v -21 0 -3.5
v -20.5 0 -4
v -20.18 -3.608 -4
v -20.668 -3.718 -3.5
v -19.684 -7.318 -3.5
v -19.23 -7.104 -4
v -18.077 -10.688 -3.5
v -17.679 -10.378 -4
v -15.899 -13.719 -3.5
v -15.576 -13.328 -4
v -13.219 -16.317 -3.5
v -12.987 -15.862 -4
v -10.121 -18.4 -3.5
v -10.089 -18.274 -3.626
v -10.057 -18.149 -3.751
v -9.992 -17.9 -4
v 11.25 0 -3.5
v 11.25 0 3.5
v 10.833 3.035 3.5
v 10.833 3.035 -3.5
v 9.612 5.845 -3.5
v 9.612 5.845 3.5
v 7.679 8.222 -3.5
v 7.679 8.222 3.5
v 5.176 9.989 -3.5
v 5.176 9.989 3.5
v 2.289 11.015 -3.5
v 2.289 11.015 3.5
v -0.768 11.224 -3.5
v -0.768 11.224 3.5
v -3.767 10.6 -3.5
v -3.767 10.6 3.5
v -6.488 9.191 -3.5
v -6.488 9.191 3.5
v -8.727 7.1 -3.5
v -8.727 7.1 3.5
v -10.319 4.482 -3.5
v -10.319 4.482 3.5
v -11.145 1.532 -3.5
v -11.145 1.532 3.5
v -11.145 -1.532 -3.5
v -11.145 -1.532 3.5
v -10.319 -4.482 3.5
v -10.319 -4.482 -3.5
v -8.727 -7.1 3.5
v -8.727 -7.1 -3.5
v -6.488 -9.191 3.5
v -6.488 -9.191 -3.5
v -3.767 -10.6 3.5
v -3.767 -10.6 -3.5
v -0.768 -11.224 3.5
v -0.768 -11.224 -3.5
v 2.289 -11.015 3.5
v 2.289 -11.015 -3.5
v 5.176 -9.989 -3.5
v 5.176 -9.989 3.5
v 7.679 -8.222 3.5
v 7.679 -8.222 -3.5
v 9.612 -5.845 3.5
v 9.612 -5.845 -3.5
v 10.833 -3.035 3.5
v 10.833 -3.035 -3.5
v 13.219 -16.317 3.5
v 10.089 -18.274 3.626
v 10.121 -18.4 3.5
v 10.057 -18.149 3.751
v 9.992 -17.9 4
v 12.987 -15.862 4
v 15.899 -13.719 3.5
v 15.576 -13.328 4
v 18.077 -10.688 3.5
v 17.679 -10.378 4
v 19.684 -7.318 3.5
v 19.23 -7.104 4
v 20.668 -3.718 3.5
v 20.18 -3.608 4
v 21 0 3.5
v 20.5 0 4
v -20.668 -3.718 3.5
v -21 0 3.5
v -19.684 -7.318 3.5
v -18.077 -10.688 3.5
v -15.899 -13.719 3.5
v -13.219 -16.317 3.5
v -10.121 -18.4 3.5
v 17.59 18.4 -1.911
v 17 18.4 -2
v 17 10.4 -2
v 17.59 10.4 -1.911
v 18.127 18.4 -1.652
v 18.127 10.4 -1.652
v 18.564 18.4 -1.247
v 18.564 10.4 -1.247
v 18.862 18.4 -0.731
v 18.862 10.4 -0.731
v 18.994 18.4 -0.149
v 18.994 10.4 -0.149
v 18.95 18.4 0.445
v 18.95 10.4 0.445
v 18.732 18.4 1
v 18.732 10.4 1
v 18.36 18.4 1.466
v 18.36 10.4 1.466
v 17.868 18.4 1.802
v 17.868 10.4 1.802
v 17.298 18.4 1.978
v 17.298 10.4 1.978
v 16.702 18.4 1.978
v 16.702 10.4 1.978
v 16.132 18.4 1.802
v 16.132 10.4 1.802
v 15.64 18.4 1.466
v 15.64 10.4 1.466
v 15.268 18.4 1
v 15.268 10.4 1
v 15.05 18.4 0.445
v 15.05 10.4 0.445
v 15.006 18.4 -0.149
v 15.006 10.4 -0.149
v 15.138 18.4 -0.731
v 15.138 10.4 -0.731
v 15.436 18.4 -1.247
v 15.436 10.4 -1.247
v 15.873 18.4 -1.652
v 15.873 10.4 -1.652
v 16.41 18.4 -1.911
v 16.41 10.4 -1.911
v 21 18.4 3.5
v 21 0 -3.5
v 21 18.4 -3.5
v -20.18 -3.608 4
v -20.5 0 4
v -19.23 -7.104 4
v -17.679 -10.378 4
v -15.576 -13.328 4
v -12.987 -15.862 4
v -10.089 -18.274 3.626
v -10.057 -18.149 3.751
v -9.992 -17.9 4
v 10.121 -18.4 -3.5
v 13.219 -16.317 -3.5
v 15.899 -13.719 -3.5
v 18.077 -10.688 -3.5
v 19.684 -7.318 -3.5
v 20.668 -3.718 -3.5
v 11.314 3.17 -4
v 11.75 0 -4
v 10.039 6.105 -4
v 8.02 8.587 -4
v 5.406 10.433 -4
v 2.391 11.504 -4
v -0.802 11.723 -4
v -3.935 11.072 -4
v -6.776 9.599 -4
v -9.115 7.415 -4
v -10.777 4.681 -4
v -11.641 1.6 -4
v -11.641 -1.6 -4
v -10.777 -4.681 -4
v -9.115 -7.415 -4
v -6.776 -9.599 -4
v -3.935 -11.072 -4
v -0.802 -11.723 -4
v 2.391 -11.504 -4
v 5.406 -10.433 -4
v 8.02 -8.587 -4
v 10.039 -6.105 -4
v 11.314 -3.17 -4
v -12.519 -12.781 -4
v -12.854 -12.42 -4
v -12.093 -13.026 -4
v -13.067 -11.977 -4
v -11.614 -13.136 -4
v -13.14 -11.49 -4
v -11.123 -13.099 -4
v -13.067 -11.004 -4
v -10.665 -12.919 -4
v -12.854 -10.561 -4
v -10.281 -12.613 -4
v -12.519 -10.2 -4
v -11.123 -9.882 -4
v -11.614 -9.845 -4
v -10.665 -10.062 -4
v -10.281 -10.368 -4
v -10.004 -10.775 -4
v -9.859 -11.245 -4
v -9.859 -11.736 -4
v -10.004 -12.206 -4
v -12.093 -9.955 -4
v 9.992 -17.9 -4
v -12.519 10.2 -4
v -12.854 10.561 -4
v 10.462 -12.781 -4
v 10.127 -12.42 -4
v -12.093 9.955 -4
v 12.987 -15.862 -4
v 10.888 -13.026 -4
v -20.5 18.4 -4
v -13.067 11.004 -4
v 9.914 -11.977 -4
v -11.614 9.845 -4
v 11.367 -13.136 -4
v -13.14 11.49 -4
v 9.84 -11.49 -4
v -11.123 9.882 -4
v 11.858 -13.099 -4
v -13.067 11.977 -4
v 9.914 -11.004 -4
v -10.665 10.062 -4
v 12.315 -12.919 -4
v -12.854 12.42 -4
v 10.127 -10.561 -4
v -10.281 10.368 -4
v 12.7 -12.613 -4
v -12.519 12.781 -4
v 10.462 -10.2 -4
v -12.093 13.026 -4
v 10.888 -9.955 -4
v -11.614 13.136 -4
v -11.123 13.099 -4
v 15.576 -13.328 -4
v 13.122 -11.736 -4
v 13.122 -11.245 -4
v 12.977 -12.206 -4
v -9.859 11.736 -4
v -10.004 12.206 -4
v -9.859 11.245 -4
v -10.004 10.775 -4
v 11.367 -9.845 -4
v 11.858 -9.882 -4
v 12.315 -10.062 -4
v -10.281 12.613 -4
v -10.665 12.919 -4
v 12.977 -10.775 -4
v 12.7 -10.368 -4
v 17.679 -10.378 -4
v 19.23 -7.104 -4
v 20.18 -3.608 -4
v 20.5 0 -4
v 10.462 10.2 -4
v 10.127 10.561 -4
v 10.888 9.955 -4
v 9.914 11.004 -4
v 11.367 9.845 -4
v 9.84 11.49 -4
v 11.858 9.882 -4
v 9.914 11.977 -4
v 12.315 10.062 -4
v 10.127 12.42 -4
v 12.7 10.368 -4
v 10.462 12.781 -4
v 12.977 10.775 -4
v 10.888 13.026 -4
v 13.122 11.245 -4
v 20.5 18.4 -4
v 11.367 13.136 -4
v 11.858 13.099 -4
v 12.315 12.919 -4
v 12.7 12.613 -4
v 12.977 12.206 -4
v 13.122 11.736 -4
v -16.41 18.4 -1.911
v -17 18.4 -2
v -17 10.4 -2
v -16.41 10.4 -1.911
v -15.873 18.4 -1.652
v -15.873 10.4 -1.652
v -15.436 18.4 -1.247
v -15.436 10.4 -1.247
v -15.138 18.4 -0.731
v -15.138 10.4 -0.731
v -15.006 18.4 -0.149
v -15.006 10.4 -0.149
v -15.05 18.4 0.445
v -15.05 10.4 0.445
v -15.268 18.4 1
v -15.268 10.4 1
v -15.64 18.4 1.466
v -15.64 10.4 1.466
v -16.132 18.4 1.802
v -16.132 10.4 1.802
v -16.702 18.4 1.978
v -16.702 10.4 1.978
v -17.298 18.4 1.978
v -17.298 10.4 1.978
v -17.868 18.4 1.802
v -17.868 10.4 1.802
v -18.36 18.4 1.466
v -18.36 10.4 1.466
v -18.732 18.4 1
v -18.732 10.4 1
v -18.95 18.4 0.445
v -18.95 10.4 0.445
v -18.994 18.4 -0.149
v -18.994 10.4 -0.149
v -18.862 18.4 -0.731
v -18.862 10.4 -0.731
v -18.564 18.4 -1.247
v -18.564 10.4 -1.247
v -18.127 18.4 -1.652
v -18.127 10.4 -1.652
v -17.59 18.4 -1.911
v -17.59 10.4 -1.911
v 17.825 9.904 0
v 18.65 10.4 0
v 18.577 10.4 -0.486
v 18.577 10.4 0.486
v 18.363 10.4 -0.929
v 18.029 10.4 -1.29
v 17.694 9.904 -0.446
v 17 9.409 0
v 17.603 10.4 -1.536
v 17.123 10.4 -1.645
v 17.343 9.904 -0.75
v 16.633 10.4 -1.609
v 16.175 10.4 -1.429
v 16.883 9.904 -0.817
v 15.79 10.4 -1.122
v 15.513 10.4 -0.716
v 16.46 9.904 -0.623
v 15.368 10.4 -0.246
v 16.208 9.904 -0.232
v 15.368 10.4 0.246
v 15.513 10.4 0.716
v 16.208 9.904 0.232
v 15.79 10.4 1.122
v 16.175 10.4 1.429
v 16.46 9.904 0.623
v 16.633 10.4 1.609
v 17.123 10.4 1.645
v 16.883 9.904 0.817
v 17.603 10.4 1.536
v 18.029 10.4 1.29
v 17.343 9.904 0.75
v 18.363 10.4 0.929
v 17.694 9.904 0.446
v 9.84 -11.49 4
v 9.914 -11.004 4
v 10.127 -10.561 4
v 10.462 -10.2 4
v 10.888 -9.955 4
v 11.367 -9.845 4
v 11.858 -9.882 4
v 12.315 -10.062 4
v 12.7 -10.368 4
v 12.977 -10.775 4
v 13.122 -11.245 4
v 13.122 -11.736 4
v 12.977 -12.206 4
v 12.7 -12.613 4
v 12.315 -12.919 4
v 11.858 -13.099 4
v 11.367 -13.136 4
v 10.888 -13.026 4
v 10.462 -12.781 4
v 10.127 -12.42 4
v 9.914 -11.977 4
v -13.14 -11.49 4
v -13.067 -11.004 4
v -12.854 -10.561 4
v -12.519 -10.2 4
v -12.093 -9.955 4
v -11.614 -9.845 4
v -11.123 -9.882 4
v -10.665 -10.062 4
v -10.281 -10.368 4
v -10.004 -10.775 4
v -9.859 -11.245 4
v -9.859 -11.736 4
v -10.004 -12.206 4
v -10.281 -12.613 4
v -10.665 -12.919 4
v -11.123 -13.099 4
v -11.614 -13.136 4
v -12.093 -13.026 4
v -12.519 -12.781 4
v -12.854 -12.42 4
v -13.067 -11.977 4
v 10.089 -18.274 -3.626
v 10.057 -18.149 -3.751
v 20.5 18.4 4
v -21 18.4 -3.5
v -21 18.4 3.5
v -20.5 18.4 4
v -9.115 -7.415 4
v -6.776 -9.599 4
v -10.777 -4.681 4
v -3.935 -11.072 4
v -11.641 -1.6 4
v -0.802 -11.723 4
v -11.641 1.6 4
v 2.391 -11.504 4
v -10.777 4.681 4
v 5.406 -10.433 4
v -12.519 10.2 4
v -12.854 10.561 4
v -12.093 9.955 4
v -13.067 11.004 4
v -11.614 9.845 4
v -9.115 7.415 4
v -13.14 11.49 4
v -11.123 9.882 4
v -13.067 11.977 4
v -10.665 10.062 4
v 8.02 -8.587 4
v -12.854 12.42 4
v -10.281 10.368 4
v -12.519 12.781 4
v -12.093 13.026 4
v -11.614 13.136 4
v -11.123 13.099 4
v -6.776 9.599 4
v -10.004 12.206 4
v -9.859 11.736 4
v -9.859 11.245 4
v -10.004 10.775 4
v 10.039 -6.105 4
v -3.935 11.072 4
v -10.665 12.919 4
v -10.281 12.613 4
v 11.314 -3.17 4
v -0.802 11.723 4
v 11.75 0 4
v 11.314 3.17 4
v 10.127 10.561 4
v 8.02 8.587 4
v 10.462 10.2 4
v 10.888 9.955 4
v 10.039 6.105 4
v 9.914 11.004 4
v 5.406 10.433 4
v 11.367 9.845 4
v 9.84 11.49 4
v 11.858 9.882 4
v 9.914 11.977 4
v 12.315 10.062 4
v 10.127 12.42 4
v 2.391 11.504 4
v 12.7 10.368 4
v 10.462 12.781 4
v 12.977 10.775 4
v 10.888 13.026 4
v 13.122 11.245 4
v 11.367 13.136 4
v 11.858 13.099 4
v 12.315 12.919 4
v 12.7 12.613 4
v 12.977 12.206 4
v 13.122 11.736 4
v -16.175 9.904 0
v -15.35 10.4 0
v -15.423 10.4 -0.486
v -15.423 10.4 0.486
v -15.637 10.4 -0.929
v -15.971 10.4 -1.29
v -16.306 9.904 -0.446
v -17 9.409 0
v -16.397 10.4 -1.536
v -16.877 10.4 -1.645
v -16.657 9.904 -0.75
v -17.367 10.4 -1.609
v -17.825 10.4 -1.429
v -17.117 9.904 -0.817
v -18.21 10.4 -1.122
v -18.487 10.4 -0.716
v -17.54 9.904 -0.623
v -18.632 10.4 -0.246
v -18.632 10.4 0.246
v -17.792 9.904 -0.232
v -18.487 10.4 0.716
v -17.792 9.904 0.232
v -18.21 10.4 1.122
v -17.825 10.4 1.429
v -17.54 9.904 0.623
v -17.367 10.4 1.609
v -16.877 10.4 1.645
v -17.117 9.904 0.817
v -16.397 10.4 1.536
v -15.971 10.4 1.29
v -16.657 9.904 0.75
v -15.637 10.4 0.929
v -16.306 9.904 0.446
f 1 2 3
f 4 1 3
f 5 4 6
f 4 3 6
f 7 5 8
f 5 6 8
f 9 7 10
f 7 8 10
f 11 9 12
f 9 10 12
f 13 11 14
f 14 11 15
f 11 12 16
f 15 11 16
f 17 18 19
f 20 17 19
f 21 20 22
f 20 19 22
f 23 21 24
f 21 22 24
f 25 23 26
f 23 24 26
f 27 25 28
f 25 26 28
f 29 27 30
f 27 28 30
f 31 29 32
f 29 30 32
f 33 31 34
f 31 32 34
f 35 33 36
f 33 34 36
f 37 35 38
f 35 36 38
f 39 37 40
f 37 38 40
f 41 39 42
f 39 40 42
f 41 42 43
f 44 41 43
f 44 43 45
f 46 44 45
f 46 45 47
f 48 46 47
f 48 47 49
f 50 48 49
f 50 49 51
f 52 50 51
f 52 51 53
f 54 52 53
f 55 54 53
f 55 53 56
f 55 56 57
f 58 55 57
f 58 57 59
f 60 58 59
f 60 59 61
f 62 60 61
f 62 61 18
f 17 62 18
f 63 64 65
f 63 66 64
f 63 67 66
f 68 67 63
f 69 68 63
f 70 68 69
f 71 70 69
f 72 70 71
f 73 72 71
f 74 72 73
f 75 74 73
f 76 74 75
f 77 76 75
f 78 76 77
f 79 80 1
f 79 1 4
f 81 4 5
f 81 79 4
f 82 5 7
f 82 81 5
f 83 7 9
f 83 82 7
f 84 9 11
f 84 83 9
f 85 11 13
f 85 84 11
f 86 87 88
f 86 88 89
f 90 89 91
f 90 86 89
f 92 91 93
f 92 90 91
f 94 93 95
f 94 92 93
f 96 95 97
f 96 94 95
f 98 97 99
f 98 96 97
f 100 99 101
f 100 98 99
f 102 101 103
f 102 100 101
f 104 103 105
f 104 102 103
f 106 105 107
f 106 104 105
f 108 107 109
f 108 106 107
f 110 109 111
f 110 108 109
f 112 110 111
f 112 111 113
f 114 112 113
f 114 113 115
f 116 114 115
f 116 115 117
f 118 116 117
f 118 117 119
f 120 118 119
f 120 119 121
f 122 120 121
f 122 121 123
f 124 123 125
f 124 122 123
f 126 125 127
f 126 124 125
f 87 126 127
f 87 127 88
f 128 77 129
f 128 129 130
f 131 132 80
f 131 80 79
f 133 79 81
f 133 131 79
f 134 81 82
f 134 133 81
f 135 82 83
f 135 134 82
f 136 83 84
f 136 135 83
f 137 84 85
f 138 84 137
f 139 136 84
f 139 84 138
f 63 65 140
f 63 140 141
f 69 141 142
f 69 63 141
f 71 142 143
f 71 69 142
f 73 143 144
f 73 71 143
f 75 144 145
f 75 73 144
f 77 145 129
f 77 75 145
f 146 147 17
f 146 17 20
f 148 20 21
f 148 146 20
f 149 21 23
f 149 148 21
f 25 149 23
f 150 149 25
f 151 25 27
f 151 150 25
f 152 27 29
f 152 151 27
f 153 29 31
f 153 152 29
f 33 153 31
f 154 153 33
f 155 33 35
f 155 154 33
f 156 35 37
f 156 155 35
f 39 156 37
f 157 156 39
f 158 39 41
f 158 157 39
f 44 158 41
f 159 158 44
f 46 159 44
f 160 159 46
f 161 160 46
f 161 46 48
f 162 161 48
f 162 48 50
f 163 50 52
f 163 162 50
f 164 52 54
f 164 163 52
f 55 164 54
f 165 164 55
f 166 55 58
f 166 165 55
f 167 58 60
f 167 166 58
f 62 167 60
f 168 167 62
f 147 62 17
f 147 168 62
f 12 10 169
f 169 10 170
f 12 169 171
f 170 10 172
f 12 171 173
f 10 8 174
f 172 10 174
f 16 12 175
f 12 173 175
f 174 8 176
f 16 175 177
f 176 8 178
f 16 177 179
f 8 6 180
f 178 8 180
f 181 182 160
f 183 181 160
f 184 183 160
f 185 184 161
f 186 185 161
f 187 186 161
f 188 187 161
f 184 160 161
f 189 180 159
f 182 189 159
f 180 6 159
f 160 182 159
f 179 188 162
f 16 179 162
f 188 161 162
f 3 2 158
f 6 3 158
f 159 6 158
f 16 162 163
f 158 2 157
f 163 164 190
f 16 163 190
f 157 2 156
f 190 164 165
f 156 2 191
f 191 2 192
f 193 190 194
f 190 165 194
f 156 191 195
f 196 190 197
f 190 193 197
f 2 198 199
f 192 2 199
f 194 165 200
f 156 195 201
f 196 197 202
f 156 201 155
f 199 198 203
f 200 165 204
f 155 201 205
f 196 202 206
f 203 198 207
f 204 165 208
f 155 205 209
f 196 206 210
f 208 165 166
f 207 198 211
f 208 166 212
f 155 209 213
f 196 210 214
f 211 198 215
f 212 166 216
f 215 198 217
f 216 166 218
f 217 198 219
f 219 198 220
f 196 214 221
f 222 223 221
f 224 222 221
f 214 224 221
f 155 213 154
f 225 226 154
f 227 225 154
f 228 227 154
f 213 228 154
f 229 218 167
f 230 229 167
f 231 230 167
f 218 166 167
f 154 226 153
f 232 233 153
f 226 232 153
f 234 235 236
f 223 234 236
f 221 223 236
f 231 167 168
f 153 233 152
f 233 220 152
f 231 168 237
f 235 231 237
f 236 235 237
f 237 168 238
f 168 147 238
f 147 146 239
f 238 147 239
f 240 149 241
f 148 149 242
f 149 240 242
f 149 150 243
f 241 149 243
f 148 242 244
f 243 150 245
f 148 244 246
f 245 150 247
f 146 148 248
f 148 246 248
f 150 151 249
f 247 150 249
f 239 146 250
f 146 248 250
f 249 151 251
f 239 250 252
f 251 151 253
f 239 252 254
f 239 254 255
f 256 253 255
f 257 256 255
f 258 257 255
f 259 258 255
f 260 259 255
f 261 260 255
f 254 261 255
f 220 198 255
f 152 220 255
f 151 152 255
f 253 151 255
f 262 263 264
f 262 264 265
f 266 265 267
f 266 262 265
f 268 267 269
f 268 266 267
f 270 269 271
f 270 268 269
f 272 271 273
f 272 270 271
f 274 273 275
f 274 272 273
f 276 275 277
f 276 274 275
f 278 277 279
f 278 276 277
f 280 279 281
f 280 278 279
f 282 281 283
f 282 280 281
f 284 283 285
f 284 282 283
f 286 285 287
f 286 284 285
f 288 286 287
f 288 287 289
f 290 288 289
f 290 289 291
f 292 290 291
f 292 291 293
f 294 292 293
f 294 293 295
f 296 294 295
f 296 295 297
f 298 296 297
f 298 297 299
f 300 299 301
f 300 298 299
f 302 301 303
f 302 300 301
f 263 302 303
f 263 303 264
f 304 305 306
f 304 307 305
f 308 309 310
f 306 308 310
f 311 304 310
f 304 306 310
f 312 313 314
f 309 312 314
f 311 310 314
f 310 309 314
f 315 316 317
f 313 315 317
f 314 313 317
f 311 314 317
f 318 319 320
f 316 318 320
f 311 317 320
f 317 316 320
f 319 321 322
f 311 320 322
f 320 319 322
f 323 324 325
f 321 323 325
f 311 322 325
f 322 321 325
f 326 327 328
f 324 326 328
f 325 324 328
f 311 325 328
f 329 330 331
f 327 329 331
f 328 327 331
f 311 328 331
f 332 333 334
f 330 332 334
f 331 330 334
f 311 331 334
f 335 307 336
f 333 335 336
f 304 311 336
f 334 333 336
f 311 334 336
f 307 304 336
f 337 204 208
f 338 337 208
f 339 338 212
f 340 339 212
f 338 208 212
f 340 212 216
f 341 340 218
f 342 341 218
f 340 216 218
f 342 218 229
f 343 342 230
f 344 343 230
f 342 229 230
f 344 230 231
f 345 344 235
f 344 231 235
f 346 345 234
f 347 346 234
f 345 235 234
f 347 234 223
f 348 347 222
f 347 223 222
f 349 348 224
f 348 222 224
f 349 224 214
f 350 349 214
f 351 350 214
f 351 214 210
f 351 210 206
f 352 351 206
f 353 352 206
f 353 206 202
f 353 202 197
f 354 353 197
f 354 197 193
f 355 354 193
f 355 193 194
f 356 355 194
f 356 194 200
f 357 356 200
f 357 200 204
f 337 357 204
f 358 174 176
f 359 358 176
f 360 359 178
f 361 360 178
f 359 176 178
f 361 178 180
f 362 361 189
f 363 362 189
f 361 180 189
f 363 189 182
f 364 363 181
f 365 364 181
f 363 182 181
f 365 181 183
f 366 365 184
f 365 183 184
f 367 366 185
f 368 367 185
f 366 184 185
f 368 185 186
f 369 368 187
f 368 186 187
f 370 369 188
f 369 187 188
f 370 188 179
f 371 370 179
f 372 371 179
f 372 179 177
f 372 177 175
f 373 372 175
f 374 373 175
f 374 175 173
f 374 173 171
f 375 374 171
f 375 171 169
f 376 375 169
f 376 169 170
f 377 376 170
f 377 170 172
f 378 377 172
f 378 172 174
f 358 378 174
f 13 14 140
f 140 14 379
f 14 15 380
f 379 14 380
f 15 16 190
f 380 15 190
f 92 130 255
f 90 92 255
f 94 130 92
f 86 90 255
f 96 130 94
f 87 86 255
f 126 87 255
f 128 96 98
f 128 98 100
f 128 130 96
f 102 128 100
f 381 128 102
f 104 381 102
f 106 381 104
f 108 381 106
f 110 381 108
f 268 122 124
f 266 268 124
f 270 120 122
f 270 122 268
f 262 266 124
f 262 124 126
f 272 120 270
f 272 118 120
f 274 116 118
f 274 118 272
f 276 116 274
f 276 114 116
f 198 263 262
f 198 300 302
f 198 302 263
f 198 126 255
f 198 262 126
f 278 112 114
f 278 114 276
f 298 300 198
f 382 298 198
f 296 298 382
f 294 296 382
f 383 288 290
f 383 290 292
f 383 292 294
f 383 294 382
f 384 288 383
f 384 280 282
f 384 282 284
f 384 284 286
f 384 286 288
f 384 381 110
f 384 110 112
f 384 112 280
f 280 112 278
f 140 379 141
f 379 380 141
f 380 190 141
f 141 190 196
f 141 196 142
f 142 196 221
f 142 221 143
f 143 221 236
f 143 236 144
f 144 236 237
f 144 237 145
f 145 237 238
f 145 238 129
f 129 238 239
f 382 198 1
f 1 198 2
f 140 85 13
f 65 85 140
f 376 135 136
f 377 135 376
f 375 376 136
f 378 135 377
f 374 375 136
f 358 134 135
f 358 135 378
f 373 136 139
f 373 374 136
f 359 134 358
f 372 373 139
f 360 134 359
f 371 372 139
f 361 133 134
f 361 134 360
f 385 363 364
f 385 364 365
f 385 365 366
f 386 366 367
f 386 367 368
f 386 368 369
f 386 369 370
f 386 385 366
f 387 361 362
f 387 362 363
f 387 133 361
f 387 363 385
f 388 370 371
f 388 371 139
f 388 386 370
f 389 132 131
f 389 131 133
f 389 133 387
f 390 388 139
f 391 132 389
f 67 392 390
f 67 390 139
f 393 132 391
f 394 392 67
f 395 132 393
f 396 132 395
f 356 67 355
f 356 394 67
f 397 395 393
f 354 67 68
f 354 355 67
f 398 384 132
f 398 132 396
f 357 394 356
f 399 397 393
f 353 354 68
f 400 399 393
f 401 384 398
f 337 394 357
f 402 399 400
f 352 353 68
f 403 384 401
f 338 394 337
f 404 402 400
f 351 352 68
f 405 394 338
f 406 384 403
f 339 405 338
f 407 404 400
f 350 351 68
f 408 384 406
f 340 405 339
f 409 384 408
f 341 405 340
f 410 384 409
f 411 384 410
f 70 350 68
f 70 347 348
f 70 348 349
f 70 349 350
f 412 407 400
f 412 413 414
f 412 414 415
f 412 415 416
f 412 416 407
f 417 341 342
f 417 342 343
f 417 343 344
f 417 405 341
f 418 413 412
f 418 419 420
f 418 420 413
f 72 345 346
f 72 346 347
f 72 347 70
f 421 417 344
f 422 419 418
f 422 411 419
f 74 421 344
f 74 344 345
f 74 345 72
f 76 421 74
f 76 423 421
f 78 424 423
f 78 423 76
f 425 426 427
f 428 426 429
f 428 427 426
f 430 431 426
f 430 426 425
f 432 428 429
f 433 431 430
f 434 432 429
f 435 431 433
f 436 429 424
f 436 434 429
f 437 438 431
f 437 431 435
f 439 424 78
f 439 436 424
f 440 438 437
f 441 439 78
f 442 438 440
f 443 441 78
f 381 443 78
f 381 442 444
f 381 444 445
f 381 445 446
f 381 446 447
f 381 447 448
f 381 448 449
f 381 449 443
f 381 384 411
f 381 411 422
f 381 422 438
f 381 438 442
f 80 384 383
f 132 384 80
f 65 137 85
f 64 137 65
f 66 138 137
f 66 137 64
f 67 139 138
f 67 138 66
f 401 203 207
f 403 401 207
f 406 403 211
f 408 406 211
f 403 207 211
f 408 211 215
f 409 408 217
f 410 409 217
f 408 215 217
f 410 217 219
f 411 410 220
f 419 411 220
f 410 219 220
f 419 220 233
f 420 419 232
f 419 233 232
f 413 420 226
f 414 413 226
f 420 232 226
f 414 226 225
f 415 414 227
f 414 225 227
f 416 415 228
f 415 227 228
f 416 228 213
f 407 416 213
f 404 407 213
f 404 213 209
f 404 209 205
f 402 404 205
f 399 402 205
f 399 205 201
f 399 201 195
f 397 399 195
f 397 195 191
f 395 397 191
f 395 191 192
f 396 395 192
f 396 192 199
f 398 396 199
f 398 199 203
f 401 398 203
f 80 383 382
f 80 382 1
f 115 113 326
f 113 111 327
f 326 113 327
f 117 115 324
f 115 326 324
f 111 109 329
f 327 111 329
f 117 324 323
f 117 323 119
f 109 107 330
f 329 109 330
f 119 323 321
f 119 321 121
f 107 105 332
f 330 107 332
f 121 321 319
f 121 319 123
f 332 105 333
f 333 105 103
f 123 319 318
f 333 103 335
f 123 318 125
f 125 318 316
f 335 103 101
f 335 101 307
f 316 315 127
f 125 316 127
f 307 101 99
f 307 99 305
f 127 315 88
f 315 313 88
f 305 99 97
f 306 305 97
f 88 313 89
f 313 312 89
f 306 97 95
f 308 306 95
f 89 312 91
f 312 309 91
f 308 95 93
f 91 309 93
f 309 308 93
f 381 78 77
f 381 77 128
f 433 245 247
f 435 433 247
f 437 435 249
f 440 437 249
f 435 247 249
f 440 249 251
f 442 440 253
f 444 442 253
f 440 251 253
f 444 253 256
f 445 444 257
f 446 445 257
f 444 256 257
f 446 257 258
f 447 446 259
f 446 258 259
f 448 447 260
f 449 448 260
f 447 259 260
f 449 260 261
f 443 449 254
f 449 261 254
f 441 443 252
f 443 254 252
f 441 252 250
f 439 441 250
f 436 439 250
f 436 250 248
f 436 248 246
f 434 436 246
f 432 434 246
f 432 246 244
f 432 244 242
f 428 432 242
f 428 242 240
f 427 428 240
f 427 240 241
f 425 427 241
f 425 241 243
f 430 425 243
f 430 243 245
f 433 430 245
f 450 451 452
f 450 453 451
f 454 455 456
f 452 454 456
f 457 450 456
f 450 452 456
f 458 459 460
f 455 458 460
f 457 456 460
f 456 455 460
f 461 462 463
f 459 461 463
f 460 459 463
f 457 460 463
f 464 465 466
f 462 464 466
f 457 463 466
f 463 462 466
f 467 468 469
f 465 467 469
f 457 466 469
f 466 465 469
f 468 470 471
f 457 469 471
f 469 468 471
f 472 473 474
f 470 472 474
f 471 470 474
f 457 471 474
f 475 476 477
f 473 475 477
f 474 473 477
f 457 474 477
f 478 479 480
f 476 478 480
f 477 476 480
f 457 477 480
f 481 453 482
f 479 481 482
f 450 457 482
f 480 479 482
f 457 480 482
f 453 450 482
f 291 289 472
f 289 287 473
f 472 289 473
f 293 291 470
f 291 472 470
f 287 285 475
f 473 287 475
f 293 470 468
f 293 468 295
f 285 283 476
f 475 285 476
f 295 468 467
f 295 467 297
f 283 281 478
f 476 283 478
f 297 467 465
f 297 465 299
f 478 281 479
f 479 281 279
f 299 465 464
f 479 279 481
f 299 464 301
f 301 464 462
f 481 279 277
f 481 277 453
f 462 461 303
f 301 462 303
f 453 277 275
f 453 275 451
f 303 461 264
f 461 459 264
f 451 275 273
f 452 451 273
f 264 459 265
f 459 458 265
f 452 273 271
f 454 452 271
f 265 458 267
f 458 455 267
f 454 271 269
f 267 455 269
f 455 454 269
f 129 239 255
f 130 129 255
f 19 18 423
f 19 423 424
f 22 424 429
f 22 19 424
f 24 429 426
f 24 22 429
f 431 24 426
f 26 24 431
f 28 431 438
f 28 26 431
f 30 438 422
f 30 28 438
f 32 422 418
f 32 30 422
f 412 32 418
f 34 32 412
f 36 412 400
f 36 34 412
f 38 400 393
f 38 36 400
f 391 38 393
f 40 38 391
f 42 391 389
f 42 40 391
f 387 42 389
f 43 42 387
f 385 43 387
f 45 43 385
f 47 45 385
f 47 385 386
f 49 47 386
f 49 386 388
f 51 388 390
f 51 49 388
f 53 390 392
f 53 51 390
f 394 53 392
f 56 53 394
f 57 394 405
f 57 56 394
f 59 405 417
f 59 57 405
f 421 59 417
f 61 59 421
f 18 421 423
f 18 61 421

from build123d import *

# Parameters (mm, degrees)
BOSS_EXTRUDE1_DEPTH       = 4
SKETCH2_R                 = 11.25
CUT_EXTRUDE1_DEPTH        = 9
M4X0_7_TAPPED_HOLE3_D     = 3.3
M4X0_7_TAPPED_HOLE1_D     = 3.3
M4X0_7_TAPPED_HOLE1_DEPTH = 8
M4X0_7_TAPPED_HOLE1_TIP   = 0.991420021
SKETCH6_R                 = 2
CUT_EXTRUDE3_DEPTH        = 8
CHAMFER1_SIZE             = 0.5


with BuildPart() as part:
    # Sketch1 → Boss-Extrude1 (new body, symmetric)
    with BuildSketch(Plane.XY):
        with BuildLine():
            Line((21, 0), (21, 18.4))
            Line((21, 18.4), (-21, 18.4))
            Line((-21, 18.4), (-21, 0))
            ThreePointArc((-21, 0), (-18.076871405, -10.687690125), (-10.121264743, -18.4))
            Line((-10.121264743, -18.4), (10.121264743, -18.4))
            ThreePointArc((10.121264743, -18.4), (18.076871405, -10.687690125), (21, 0))
        make_face()
    extrude(amount=BOSS_EXTRUDE1_DEPTH, both=True)

    # Sketch2 → Cut-Extrude1 (cut, through all)
    with BuildSketch(Plane.XY.offset(4)):
        Circle(SKETCH2_R)
    extrude(amount=-CUT_EXTRUDE1_DEPTH, mode=Mode.SUBTRACT)

    # M4x0.7 Tapped Hole3 (through all)
    with Locations(Plane.XY.offset(4)):
        with Locations((-11.490485194, 11.490485194), (11.490485194, 11.490485194), (11.490485194, -11.490485194), (-11.490485194, -11.490485194)):
            Hole(M4X0_7_TAPPED_HOLE3_D / 2)

    # M4x0.7 Tapped Hole1
    with Locations(Plane(origin=(0, 18.4, 0), x_dir=(1, 0, 0), z_dir=(0, 1, 0))):
        with Locations((-17, 0), (17, 0)):
            Hole(M4X0_7_TAPPED_HOLE1_D / 2, depth=M4X0_7_TAPPED_HOLE1_DEPTH)
            with Locations((0, 0, -(M4X0_7_TAPPED_HOLE1_DEPTH + M4X0_7_TAPPED_HOLE1_TIP / 2))):  # 118° drill point
                Cone(0, M4X0_7_TAPPED_HOLE1_D / 2, M4X0_7_TAPPED_HOLE1_TIP, mode=Mode.SUBTRACT)

    # Sketch6 → Cut-Extrude3 (cut)
    with BuildSketch(Plane(origin=(-3.375, 18.4, 0), x_dir=(0, 0, -1), z_dir=(0, -1, 0))):
        with Locations((0, -13.625)):
            Circle(SKETCH6_R)
        with Locations((0, 20.375)):
            Circle(SKETCH6_R)
    extrude(amount=CUT_EXTRUDE3_DEPTH, mode=Mode.SUBTRACT)

    # Chamfer1
    chamfer1_edges = [part.edges().sort_by_distance(p)[0] for p in [
        (-21, 9.2, 4),
        (-18.076871405, -10.687690125, 4),
        (0, -18.4, 4),
        (-11.25, 0, -4),
        (-11.25, 0, 4),
        (18.076871405, -10.687690125, 4),
        (0, -18.4, -4),
        (-18.076871405, -10.687690125, -4),
        (-21, 9.2, -4),
        (21, 9.2, 4),
        (21, 9.2, -4),
        (18.076871405, -10.687690125, -4),
    ]]
    chamfer(chamfer1_edges, length=CHAMFER1_SIZE)


solid = part.part
